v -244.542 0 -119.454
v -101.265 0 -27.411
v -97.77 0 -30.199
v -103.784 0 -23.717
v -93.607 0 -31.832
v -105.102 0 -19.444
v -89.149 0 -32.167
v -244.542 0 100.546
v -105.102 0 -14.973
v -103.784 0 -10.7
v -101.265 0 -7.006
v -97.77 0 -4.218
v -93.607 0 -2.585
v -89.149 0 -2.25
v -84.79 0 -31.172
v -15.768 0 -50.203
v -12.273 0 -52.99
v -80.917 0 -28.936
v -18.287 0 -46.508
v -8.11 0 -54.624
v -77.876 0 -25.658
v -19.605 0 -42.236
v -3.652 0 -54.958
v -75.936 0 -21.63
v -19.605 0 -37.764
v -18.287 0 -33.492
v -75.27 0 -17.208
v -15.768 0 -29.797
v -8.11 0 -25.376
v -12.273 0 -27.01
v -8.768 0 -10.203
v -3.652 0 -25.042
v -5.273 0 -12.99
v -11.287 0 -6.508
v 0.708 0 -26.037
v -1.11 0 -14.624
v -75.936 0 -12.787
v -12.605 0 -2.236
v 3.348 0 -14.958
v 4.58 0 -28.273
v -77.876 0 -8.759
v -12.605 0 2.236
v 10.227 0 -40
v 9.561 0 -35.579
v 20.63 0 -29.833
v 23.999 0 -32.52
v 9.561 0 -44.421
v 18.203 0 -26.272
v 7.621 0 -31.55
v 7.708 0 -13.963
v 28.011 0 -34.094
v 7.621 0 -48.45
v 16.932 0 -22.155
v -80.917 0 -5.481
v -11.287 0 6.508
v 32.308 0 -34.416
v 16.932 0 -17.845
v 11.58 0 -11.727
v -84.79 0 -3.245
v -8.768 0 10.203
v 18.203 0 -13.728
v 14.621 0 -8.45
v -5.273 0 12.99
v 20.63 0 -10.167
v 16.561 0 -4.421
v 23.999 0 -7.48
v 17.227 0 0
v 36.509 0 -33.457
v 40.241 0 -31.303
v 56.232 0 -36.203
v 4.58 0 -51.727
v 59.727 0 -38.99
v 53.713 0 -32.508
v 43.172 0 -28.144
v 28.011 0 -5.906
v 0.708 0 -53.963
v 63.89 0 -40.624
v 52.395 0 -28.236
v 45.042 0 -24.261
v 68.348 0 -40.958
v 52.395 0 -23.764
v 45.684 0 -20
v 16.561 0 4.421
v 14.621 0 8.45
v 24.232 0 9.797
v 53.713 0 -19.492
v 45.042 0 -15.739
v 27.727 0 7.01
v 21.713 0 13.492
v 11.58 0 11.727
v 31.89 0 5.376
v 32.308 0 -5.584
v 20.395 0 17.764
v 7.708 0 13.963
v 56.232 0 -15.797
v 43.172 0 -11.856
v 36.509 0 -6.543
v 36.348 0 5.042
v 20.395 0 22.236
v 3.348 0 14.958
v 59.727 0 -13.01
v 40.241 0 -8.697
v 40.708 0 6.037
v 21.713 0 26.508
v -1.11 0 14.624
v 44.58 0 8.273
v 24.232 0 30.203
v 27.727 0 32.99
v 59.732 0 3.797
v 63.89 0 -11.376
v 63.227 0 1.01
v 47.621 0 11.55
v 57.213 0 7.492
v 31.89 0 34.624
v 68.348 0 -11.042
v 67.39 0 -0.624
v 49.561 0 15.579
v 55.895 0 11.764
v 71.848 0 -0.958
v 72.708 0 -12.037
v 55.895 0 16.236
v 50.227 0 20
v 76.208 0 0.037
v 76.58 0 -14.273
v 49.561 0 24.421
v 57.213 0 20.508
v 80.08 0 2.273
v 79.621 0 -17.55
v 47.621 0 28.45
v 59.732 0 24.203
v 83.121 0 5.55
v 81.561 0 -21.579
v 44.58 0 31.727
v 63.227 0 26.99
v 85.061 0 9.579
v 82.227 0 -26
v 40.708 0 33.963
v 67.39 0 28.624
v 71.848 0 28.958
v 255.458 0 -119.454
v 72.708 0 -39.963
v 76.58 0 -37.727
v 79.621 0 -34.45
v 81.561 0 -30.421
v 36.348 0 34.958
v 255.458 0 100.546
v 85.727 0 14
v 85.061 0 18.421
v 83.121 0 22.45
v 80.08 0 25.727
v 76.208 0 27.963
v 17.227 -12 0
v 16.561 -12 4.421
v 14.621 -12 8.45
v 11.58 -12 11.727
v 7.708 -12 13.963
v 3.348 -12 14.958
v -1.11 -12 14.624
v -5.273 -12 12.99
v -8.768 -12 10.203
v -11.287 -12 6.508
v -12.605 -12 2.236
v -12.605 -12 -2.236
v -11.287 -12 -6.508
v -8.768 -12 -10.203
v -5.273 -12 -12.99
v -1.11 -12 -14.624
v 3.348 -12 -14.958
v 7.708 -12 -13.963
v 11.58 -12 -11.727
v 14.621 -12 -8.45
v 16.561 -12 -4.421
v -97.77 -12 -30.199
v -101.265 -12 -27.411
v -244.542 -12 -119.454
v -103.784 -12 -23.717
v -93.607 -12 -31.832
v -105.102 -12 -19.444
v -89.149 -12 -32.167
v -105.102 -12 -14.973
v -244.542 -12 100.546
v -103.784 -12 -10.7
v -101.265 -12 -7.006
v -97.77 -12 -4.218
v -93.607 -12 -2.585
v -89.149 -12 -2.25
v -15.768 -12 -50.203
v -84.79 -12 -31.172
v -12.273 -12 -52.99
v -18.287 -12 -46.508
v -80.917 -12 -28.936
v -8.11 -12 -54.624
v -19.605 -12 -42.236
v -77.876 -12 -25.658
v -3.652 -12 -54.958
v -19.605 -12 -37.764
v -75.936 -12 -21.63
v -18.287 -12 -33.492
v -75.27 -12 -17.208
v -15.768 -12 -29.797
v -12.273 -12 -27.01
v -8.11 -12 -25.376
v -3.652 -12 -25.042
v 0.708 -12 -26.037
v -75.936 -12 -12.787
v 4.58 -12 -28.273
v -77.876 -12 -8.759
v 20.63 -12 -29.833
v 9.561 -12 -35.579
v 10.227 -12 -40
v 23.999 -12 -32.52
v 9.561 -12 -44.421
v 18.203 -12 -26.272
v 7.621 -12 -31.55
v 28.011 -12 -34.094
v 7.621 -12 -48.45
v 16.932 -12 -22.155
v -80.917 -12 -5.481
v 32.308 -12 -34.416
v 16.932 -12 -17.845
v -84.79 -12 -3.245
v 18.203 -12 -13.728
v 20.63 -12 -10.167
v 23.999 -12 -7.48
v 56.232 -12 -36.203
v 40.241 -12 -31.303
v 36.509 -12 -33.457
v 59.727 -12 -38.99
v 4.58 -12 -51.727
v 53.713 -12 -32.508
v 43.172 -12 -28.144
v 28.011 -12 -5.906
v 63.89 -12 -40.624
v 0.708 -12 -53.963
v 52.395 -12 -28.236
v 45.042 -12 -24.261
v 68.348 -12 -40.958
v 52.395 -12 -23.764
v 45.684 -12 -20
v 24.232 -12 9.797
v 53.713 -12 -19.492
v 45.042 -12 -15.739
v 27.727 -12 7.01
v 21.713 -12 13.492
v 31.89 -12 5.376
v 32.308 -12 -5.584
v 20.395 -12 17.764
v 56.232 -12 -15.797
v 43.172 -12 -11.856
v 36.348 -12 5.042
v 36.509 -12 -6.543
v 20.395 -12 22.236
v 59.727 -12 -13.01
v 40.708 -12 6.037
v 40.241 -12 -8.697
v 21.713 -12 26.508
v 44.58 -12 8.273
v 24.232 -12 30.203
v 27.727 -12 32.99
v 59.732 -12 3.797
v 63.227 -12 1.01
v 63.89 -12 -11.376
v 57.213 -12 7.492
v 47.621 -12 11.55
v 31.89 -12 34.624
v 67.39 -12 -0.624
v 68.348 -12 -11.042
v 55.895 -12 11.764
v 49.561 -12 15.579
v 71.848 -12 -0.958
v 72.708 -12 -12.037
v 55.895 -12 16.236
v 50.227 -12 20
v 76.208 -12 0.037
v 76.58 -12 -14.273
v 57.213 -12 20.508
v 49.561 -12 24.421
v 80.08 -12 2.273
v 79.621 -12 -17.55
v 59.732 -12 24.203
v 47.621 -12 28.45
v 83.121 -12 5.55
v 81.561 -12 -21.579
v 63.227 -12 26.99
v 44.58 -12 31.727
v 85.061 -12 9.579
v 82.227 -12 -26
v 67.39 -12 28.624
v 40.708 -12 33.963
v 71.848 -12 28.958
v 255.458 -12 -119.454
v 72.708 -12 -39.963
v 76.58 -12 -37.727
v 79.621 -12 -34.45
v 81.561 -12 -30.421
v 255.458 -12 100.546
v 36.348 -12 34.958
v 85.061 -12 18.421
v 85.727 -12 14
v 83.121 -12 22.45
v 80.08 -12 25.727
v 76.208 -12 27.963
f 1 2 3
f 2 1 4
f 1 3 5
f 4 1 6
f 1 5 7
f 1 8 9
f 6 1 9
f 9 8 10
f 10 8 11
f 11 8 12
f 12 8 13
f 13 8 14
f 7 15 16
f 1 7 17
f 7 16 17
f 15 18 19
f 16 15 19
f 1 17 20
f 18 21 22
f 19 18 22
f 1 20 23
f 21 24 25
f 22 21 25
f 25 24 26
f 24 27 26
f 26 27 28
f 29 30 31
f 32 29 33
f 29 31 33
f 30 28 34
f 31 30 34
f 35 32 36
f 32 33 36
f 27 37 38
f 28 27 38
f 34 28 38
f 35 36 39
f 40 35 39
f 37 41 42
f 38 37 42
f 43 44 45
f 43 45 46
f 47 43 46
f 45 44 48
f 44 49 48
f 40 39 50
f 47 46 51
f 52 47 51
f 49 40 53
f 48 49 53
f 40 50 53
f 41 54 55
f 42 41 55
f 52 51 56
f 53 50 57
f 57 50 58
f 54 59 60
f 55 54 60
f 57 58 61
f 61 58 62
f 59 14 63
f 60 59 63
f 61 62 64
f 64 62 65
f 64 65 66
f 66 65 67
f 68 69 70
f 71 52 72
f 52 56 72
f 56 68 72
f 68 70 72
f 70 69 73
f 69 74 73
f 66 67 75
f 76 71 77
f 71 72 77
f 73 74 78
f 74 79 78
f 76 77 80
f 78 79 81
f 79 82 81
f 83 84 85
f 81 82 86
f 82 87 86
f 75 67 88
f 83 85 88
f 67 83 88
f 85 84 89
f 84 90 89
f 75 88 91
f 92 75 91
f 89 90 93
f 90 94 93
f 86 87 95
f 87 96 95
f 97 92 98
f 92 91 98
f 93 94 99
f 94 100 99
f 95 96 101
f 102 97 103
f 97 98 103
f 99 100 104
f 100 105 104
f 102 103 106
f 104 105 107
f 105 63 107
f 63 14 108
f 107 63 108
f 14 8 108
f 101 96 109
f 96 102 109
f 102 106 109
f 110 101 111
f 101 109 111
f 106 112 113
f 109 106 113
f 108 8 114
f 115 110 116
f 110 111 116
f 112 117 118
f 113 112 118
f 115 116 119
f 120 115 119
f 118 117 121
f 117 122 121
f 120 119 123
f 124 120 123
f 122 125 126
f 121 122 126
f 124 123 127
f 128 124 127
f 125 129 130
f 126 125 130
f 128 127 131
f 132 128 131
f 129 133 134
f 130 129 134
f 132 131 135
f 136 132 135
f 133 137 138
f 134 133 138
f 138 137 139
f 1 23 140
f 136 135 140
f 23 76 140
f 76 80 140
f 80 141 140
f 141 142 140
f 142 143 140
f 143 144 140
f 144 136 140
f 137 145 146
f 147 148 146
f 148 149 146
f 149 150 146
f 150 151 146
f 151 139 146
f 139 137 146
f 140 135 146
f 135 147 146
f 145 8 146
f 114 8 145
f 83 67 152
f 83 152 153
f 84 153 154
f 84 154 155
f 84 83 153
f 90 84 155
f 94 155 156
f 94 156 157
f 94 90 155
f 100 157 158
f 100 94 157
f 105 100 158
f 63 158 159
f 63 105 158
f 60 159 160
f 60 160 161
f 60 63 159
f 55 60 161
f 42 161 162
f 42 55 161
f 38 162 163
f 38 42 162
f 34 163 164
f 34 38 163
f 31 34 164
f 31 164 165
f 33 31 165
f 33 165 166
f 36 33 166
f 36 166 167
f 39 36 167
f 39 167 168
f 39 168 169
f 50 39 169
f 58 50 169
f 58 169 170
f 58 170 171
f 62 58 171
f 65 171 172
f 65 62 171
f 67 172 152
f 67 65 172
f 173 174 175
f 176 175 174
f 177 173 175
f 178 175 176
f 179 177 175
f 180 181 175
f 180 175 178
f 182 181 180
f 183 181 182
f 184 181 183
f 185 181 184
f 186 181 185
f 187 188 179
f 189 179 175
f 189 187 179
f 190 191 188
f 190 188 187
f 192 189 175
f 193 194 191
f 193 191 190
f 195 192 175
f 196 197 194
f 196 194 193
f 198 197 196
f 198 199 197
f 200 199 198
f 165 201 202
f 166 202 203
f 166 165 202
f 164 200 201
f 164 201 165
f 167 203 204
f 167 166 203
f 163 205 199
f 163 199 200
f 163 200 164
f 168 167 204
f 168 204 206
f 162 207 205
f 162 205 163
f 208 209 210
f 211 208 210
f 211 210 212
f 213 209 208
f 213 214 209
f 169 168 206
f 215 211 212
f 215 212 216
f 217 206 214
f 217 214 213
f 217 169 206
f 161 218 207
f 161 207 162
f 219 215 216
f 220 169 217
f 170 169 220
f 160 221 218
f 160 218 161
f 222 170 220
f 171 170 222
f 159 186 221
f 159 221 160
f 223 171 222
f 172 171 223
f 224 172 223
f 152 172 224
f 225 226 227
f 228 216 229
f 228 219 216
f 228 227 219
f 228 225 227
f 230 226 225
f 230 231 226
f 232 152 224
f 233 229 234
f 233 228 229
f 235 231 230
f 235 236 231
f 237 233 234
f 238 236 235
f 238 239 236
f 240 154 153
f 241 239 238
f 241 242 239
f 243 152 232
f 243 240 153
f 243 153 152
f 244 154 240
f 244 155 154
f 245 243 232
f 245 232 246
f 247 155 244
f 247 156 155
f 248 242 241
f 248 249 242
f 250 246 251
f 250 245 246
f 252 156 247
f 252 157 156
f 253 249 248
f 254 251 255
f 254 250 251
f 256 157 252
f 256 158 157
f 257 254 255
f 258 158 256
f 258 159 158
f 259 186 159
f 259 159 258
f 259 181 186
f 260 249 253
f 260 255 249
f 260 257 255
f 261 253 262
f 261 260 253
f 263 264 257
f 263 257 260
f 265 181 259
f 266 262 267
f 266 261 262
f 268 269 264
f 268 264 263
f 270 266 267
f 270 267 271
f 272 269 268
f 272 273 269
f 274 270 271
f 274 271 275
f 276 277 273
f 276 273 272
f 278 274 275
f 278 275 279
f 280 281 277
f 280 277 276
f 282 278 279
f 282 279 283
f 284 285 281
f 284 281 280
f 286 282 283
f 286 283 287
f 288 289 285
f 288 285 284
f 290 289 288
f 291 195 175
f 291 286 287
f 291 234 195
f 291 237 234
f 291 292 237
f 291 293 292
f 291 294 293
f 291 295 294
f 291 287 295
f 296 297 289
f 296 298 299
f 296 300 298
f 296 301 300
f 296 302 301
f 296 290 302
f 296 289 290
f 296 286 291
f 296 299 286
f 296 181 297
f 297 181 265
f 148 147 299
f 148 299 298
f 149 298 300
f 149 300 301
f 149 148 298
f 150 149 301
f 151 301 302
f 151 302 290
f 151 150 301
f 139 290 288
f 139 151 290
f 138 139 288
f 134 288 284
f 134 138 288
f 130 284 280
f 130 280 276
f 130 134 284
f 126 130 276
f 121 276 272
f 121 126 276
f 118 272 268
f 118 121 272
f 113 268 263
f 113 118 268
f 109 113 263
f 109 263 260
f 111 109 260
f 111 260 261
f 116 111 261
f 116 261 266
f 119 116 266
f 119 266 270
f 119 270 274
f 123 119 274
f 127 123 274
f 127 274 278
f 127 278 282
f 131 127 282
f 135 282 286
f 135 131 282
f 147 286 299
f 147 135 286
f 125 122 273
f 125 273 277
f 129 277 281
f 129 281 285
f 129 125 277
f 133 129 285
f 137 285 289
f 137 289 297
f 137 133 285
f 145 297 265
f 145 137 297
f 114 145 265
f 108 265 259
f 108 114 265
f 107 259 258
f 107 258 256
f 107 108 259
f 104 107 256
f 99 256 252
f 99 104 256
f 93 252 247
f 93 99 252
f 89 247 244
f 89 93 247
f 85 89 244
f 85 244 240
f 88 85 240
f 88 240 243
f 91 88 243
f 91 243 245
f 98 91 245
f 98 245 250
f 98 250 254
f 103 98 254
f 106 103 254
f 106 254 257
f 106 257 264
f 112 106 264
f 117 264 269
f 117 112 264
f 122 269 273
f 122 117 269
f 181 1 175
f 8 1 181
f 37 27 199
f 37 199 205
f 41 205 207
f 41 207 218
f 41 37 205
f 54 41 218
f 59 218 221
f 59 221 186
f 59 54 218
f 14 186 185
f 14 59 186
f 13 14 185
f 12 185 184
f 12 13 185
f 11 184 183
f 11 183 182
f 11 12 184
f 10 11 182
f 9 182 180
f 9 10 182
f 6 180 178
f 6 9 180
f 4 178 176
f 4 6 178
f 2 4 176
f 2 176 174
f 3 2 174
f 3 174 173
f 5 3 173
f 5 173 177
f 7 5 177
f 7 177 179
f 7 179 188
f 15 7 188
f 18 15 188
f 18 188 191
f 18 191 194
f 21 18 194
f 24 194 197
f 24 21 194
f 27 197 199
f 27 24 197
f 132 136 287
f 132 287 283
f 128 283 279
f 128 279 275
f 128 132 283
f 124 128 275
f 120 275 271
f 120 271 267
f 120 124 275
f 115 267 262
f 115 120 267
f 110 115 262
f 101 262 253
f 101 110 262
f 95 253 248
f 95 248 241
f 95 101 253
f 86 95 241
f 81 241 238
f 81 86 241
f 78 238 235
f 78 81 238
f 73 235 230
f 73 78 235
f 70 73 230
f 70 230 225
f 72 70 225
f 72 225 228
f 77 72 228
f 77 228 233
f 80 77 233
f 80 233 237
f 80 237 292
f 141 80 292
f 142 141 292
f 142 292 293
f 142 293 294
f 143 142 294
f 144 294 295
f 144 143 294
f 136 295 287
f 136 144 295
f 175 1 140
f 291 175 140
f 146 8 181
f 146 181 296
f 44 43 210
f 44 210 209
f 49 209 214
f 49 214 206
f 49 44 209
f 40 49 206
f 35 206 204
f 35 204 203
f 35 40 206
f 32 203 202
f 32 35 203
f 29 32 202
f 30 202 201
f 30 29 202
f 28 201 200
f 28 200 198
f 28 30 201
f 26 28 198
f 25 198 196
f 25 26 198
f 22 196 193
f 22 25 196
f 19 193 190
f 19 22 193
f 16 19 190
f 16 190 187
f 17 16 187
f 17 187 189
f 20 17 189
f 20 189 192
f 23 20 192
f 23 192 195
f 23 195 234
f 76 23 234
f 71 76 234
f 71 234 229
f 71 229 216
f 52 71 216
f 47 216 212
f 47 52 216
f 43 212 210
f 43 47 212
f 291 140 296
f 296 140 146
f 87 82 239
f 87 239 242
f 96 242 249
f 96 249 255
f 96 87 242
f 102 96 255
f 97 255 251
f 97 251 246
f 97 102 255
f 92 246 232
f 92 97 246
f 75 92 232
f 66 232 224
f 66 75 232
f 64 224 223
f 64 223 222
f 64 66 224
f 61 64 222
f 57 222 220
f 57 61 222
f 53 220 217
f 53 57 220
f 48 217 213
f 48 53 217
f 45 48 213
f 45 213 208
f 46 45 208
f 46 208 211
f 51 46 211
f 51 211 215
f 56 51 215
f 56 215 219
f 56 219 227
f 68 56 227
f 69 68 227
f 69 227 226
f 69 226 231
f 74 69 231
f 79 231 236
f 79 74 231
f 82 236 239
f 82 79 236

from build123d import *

# Parameters (mm, degrees)
F0_W     = 500
F0_H     = 220
F0_R     = 15
F0_R_2   = 14.456537
F1_DEPTH = 12


with BuildPart() as f1:
    # F0 (on Front) → F1 (new body)
    with BuildSketch(Plane.XZ):
        with Locations((5.457865, -9.454479)):
            Rectangle(F0_W, F0_H)
        with Locations((-4.772537, -40)):
            Circle(F0_R, mode=Mode.SUBTRACT)
        with Locations((-90.26964, -17.208472)):
            Circle(F0_R, mode=Mode.SUBTRACT)
        with Locations((67.227463, -26)):
            Circle(F0_R, mode=Mode.SUBTRACT)
        with Locations((31.227463, -20)):
            Circle(F0_R_2, mode=Mode.SUBTRACT)
        with Locations((2.227463, 0)):
            Circle(F0_R, mode=Mode.SUBTRACT)
        with Locations((70.727463, 14)):
            Circle(F0_R, mode=Mode.SUBTRACT)
        with Locations((35.227463, 20)):
            Circle(F0_R, mode=Mode.SUBTRACT)
    extrude(amount=F1_DEPTH)


solid = f1.part
